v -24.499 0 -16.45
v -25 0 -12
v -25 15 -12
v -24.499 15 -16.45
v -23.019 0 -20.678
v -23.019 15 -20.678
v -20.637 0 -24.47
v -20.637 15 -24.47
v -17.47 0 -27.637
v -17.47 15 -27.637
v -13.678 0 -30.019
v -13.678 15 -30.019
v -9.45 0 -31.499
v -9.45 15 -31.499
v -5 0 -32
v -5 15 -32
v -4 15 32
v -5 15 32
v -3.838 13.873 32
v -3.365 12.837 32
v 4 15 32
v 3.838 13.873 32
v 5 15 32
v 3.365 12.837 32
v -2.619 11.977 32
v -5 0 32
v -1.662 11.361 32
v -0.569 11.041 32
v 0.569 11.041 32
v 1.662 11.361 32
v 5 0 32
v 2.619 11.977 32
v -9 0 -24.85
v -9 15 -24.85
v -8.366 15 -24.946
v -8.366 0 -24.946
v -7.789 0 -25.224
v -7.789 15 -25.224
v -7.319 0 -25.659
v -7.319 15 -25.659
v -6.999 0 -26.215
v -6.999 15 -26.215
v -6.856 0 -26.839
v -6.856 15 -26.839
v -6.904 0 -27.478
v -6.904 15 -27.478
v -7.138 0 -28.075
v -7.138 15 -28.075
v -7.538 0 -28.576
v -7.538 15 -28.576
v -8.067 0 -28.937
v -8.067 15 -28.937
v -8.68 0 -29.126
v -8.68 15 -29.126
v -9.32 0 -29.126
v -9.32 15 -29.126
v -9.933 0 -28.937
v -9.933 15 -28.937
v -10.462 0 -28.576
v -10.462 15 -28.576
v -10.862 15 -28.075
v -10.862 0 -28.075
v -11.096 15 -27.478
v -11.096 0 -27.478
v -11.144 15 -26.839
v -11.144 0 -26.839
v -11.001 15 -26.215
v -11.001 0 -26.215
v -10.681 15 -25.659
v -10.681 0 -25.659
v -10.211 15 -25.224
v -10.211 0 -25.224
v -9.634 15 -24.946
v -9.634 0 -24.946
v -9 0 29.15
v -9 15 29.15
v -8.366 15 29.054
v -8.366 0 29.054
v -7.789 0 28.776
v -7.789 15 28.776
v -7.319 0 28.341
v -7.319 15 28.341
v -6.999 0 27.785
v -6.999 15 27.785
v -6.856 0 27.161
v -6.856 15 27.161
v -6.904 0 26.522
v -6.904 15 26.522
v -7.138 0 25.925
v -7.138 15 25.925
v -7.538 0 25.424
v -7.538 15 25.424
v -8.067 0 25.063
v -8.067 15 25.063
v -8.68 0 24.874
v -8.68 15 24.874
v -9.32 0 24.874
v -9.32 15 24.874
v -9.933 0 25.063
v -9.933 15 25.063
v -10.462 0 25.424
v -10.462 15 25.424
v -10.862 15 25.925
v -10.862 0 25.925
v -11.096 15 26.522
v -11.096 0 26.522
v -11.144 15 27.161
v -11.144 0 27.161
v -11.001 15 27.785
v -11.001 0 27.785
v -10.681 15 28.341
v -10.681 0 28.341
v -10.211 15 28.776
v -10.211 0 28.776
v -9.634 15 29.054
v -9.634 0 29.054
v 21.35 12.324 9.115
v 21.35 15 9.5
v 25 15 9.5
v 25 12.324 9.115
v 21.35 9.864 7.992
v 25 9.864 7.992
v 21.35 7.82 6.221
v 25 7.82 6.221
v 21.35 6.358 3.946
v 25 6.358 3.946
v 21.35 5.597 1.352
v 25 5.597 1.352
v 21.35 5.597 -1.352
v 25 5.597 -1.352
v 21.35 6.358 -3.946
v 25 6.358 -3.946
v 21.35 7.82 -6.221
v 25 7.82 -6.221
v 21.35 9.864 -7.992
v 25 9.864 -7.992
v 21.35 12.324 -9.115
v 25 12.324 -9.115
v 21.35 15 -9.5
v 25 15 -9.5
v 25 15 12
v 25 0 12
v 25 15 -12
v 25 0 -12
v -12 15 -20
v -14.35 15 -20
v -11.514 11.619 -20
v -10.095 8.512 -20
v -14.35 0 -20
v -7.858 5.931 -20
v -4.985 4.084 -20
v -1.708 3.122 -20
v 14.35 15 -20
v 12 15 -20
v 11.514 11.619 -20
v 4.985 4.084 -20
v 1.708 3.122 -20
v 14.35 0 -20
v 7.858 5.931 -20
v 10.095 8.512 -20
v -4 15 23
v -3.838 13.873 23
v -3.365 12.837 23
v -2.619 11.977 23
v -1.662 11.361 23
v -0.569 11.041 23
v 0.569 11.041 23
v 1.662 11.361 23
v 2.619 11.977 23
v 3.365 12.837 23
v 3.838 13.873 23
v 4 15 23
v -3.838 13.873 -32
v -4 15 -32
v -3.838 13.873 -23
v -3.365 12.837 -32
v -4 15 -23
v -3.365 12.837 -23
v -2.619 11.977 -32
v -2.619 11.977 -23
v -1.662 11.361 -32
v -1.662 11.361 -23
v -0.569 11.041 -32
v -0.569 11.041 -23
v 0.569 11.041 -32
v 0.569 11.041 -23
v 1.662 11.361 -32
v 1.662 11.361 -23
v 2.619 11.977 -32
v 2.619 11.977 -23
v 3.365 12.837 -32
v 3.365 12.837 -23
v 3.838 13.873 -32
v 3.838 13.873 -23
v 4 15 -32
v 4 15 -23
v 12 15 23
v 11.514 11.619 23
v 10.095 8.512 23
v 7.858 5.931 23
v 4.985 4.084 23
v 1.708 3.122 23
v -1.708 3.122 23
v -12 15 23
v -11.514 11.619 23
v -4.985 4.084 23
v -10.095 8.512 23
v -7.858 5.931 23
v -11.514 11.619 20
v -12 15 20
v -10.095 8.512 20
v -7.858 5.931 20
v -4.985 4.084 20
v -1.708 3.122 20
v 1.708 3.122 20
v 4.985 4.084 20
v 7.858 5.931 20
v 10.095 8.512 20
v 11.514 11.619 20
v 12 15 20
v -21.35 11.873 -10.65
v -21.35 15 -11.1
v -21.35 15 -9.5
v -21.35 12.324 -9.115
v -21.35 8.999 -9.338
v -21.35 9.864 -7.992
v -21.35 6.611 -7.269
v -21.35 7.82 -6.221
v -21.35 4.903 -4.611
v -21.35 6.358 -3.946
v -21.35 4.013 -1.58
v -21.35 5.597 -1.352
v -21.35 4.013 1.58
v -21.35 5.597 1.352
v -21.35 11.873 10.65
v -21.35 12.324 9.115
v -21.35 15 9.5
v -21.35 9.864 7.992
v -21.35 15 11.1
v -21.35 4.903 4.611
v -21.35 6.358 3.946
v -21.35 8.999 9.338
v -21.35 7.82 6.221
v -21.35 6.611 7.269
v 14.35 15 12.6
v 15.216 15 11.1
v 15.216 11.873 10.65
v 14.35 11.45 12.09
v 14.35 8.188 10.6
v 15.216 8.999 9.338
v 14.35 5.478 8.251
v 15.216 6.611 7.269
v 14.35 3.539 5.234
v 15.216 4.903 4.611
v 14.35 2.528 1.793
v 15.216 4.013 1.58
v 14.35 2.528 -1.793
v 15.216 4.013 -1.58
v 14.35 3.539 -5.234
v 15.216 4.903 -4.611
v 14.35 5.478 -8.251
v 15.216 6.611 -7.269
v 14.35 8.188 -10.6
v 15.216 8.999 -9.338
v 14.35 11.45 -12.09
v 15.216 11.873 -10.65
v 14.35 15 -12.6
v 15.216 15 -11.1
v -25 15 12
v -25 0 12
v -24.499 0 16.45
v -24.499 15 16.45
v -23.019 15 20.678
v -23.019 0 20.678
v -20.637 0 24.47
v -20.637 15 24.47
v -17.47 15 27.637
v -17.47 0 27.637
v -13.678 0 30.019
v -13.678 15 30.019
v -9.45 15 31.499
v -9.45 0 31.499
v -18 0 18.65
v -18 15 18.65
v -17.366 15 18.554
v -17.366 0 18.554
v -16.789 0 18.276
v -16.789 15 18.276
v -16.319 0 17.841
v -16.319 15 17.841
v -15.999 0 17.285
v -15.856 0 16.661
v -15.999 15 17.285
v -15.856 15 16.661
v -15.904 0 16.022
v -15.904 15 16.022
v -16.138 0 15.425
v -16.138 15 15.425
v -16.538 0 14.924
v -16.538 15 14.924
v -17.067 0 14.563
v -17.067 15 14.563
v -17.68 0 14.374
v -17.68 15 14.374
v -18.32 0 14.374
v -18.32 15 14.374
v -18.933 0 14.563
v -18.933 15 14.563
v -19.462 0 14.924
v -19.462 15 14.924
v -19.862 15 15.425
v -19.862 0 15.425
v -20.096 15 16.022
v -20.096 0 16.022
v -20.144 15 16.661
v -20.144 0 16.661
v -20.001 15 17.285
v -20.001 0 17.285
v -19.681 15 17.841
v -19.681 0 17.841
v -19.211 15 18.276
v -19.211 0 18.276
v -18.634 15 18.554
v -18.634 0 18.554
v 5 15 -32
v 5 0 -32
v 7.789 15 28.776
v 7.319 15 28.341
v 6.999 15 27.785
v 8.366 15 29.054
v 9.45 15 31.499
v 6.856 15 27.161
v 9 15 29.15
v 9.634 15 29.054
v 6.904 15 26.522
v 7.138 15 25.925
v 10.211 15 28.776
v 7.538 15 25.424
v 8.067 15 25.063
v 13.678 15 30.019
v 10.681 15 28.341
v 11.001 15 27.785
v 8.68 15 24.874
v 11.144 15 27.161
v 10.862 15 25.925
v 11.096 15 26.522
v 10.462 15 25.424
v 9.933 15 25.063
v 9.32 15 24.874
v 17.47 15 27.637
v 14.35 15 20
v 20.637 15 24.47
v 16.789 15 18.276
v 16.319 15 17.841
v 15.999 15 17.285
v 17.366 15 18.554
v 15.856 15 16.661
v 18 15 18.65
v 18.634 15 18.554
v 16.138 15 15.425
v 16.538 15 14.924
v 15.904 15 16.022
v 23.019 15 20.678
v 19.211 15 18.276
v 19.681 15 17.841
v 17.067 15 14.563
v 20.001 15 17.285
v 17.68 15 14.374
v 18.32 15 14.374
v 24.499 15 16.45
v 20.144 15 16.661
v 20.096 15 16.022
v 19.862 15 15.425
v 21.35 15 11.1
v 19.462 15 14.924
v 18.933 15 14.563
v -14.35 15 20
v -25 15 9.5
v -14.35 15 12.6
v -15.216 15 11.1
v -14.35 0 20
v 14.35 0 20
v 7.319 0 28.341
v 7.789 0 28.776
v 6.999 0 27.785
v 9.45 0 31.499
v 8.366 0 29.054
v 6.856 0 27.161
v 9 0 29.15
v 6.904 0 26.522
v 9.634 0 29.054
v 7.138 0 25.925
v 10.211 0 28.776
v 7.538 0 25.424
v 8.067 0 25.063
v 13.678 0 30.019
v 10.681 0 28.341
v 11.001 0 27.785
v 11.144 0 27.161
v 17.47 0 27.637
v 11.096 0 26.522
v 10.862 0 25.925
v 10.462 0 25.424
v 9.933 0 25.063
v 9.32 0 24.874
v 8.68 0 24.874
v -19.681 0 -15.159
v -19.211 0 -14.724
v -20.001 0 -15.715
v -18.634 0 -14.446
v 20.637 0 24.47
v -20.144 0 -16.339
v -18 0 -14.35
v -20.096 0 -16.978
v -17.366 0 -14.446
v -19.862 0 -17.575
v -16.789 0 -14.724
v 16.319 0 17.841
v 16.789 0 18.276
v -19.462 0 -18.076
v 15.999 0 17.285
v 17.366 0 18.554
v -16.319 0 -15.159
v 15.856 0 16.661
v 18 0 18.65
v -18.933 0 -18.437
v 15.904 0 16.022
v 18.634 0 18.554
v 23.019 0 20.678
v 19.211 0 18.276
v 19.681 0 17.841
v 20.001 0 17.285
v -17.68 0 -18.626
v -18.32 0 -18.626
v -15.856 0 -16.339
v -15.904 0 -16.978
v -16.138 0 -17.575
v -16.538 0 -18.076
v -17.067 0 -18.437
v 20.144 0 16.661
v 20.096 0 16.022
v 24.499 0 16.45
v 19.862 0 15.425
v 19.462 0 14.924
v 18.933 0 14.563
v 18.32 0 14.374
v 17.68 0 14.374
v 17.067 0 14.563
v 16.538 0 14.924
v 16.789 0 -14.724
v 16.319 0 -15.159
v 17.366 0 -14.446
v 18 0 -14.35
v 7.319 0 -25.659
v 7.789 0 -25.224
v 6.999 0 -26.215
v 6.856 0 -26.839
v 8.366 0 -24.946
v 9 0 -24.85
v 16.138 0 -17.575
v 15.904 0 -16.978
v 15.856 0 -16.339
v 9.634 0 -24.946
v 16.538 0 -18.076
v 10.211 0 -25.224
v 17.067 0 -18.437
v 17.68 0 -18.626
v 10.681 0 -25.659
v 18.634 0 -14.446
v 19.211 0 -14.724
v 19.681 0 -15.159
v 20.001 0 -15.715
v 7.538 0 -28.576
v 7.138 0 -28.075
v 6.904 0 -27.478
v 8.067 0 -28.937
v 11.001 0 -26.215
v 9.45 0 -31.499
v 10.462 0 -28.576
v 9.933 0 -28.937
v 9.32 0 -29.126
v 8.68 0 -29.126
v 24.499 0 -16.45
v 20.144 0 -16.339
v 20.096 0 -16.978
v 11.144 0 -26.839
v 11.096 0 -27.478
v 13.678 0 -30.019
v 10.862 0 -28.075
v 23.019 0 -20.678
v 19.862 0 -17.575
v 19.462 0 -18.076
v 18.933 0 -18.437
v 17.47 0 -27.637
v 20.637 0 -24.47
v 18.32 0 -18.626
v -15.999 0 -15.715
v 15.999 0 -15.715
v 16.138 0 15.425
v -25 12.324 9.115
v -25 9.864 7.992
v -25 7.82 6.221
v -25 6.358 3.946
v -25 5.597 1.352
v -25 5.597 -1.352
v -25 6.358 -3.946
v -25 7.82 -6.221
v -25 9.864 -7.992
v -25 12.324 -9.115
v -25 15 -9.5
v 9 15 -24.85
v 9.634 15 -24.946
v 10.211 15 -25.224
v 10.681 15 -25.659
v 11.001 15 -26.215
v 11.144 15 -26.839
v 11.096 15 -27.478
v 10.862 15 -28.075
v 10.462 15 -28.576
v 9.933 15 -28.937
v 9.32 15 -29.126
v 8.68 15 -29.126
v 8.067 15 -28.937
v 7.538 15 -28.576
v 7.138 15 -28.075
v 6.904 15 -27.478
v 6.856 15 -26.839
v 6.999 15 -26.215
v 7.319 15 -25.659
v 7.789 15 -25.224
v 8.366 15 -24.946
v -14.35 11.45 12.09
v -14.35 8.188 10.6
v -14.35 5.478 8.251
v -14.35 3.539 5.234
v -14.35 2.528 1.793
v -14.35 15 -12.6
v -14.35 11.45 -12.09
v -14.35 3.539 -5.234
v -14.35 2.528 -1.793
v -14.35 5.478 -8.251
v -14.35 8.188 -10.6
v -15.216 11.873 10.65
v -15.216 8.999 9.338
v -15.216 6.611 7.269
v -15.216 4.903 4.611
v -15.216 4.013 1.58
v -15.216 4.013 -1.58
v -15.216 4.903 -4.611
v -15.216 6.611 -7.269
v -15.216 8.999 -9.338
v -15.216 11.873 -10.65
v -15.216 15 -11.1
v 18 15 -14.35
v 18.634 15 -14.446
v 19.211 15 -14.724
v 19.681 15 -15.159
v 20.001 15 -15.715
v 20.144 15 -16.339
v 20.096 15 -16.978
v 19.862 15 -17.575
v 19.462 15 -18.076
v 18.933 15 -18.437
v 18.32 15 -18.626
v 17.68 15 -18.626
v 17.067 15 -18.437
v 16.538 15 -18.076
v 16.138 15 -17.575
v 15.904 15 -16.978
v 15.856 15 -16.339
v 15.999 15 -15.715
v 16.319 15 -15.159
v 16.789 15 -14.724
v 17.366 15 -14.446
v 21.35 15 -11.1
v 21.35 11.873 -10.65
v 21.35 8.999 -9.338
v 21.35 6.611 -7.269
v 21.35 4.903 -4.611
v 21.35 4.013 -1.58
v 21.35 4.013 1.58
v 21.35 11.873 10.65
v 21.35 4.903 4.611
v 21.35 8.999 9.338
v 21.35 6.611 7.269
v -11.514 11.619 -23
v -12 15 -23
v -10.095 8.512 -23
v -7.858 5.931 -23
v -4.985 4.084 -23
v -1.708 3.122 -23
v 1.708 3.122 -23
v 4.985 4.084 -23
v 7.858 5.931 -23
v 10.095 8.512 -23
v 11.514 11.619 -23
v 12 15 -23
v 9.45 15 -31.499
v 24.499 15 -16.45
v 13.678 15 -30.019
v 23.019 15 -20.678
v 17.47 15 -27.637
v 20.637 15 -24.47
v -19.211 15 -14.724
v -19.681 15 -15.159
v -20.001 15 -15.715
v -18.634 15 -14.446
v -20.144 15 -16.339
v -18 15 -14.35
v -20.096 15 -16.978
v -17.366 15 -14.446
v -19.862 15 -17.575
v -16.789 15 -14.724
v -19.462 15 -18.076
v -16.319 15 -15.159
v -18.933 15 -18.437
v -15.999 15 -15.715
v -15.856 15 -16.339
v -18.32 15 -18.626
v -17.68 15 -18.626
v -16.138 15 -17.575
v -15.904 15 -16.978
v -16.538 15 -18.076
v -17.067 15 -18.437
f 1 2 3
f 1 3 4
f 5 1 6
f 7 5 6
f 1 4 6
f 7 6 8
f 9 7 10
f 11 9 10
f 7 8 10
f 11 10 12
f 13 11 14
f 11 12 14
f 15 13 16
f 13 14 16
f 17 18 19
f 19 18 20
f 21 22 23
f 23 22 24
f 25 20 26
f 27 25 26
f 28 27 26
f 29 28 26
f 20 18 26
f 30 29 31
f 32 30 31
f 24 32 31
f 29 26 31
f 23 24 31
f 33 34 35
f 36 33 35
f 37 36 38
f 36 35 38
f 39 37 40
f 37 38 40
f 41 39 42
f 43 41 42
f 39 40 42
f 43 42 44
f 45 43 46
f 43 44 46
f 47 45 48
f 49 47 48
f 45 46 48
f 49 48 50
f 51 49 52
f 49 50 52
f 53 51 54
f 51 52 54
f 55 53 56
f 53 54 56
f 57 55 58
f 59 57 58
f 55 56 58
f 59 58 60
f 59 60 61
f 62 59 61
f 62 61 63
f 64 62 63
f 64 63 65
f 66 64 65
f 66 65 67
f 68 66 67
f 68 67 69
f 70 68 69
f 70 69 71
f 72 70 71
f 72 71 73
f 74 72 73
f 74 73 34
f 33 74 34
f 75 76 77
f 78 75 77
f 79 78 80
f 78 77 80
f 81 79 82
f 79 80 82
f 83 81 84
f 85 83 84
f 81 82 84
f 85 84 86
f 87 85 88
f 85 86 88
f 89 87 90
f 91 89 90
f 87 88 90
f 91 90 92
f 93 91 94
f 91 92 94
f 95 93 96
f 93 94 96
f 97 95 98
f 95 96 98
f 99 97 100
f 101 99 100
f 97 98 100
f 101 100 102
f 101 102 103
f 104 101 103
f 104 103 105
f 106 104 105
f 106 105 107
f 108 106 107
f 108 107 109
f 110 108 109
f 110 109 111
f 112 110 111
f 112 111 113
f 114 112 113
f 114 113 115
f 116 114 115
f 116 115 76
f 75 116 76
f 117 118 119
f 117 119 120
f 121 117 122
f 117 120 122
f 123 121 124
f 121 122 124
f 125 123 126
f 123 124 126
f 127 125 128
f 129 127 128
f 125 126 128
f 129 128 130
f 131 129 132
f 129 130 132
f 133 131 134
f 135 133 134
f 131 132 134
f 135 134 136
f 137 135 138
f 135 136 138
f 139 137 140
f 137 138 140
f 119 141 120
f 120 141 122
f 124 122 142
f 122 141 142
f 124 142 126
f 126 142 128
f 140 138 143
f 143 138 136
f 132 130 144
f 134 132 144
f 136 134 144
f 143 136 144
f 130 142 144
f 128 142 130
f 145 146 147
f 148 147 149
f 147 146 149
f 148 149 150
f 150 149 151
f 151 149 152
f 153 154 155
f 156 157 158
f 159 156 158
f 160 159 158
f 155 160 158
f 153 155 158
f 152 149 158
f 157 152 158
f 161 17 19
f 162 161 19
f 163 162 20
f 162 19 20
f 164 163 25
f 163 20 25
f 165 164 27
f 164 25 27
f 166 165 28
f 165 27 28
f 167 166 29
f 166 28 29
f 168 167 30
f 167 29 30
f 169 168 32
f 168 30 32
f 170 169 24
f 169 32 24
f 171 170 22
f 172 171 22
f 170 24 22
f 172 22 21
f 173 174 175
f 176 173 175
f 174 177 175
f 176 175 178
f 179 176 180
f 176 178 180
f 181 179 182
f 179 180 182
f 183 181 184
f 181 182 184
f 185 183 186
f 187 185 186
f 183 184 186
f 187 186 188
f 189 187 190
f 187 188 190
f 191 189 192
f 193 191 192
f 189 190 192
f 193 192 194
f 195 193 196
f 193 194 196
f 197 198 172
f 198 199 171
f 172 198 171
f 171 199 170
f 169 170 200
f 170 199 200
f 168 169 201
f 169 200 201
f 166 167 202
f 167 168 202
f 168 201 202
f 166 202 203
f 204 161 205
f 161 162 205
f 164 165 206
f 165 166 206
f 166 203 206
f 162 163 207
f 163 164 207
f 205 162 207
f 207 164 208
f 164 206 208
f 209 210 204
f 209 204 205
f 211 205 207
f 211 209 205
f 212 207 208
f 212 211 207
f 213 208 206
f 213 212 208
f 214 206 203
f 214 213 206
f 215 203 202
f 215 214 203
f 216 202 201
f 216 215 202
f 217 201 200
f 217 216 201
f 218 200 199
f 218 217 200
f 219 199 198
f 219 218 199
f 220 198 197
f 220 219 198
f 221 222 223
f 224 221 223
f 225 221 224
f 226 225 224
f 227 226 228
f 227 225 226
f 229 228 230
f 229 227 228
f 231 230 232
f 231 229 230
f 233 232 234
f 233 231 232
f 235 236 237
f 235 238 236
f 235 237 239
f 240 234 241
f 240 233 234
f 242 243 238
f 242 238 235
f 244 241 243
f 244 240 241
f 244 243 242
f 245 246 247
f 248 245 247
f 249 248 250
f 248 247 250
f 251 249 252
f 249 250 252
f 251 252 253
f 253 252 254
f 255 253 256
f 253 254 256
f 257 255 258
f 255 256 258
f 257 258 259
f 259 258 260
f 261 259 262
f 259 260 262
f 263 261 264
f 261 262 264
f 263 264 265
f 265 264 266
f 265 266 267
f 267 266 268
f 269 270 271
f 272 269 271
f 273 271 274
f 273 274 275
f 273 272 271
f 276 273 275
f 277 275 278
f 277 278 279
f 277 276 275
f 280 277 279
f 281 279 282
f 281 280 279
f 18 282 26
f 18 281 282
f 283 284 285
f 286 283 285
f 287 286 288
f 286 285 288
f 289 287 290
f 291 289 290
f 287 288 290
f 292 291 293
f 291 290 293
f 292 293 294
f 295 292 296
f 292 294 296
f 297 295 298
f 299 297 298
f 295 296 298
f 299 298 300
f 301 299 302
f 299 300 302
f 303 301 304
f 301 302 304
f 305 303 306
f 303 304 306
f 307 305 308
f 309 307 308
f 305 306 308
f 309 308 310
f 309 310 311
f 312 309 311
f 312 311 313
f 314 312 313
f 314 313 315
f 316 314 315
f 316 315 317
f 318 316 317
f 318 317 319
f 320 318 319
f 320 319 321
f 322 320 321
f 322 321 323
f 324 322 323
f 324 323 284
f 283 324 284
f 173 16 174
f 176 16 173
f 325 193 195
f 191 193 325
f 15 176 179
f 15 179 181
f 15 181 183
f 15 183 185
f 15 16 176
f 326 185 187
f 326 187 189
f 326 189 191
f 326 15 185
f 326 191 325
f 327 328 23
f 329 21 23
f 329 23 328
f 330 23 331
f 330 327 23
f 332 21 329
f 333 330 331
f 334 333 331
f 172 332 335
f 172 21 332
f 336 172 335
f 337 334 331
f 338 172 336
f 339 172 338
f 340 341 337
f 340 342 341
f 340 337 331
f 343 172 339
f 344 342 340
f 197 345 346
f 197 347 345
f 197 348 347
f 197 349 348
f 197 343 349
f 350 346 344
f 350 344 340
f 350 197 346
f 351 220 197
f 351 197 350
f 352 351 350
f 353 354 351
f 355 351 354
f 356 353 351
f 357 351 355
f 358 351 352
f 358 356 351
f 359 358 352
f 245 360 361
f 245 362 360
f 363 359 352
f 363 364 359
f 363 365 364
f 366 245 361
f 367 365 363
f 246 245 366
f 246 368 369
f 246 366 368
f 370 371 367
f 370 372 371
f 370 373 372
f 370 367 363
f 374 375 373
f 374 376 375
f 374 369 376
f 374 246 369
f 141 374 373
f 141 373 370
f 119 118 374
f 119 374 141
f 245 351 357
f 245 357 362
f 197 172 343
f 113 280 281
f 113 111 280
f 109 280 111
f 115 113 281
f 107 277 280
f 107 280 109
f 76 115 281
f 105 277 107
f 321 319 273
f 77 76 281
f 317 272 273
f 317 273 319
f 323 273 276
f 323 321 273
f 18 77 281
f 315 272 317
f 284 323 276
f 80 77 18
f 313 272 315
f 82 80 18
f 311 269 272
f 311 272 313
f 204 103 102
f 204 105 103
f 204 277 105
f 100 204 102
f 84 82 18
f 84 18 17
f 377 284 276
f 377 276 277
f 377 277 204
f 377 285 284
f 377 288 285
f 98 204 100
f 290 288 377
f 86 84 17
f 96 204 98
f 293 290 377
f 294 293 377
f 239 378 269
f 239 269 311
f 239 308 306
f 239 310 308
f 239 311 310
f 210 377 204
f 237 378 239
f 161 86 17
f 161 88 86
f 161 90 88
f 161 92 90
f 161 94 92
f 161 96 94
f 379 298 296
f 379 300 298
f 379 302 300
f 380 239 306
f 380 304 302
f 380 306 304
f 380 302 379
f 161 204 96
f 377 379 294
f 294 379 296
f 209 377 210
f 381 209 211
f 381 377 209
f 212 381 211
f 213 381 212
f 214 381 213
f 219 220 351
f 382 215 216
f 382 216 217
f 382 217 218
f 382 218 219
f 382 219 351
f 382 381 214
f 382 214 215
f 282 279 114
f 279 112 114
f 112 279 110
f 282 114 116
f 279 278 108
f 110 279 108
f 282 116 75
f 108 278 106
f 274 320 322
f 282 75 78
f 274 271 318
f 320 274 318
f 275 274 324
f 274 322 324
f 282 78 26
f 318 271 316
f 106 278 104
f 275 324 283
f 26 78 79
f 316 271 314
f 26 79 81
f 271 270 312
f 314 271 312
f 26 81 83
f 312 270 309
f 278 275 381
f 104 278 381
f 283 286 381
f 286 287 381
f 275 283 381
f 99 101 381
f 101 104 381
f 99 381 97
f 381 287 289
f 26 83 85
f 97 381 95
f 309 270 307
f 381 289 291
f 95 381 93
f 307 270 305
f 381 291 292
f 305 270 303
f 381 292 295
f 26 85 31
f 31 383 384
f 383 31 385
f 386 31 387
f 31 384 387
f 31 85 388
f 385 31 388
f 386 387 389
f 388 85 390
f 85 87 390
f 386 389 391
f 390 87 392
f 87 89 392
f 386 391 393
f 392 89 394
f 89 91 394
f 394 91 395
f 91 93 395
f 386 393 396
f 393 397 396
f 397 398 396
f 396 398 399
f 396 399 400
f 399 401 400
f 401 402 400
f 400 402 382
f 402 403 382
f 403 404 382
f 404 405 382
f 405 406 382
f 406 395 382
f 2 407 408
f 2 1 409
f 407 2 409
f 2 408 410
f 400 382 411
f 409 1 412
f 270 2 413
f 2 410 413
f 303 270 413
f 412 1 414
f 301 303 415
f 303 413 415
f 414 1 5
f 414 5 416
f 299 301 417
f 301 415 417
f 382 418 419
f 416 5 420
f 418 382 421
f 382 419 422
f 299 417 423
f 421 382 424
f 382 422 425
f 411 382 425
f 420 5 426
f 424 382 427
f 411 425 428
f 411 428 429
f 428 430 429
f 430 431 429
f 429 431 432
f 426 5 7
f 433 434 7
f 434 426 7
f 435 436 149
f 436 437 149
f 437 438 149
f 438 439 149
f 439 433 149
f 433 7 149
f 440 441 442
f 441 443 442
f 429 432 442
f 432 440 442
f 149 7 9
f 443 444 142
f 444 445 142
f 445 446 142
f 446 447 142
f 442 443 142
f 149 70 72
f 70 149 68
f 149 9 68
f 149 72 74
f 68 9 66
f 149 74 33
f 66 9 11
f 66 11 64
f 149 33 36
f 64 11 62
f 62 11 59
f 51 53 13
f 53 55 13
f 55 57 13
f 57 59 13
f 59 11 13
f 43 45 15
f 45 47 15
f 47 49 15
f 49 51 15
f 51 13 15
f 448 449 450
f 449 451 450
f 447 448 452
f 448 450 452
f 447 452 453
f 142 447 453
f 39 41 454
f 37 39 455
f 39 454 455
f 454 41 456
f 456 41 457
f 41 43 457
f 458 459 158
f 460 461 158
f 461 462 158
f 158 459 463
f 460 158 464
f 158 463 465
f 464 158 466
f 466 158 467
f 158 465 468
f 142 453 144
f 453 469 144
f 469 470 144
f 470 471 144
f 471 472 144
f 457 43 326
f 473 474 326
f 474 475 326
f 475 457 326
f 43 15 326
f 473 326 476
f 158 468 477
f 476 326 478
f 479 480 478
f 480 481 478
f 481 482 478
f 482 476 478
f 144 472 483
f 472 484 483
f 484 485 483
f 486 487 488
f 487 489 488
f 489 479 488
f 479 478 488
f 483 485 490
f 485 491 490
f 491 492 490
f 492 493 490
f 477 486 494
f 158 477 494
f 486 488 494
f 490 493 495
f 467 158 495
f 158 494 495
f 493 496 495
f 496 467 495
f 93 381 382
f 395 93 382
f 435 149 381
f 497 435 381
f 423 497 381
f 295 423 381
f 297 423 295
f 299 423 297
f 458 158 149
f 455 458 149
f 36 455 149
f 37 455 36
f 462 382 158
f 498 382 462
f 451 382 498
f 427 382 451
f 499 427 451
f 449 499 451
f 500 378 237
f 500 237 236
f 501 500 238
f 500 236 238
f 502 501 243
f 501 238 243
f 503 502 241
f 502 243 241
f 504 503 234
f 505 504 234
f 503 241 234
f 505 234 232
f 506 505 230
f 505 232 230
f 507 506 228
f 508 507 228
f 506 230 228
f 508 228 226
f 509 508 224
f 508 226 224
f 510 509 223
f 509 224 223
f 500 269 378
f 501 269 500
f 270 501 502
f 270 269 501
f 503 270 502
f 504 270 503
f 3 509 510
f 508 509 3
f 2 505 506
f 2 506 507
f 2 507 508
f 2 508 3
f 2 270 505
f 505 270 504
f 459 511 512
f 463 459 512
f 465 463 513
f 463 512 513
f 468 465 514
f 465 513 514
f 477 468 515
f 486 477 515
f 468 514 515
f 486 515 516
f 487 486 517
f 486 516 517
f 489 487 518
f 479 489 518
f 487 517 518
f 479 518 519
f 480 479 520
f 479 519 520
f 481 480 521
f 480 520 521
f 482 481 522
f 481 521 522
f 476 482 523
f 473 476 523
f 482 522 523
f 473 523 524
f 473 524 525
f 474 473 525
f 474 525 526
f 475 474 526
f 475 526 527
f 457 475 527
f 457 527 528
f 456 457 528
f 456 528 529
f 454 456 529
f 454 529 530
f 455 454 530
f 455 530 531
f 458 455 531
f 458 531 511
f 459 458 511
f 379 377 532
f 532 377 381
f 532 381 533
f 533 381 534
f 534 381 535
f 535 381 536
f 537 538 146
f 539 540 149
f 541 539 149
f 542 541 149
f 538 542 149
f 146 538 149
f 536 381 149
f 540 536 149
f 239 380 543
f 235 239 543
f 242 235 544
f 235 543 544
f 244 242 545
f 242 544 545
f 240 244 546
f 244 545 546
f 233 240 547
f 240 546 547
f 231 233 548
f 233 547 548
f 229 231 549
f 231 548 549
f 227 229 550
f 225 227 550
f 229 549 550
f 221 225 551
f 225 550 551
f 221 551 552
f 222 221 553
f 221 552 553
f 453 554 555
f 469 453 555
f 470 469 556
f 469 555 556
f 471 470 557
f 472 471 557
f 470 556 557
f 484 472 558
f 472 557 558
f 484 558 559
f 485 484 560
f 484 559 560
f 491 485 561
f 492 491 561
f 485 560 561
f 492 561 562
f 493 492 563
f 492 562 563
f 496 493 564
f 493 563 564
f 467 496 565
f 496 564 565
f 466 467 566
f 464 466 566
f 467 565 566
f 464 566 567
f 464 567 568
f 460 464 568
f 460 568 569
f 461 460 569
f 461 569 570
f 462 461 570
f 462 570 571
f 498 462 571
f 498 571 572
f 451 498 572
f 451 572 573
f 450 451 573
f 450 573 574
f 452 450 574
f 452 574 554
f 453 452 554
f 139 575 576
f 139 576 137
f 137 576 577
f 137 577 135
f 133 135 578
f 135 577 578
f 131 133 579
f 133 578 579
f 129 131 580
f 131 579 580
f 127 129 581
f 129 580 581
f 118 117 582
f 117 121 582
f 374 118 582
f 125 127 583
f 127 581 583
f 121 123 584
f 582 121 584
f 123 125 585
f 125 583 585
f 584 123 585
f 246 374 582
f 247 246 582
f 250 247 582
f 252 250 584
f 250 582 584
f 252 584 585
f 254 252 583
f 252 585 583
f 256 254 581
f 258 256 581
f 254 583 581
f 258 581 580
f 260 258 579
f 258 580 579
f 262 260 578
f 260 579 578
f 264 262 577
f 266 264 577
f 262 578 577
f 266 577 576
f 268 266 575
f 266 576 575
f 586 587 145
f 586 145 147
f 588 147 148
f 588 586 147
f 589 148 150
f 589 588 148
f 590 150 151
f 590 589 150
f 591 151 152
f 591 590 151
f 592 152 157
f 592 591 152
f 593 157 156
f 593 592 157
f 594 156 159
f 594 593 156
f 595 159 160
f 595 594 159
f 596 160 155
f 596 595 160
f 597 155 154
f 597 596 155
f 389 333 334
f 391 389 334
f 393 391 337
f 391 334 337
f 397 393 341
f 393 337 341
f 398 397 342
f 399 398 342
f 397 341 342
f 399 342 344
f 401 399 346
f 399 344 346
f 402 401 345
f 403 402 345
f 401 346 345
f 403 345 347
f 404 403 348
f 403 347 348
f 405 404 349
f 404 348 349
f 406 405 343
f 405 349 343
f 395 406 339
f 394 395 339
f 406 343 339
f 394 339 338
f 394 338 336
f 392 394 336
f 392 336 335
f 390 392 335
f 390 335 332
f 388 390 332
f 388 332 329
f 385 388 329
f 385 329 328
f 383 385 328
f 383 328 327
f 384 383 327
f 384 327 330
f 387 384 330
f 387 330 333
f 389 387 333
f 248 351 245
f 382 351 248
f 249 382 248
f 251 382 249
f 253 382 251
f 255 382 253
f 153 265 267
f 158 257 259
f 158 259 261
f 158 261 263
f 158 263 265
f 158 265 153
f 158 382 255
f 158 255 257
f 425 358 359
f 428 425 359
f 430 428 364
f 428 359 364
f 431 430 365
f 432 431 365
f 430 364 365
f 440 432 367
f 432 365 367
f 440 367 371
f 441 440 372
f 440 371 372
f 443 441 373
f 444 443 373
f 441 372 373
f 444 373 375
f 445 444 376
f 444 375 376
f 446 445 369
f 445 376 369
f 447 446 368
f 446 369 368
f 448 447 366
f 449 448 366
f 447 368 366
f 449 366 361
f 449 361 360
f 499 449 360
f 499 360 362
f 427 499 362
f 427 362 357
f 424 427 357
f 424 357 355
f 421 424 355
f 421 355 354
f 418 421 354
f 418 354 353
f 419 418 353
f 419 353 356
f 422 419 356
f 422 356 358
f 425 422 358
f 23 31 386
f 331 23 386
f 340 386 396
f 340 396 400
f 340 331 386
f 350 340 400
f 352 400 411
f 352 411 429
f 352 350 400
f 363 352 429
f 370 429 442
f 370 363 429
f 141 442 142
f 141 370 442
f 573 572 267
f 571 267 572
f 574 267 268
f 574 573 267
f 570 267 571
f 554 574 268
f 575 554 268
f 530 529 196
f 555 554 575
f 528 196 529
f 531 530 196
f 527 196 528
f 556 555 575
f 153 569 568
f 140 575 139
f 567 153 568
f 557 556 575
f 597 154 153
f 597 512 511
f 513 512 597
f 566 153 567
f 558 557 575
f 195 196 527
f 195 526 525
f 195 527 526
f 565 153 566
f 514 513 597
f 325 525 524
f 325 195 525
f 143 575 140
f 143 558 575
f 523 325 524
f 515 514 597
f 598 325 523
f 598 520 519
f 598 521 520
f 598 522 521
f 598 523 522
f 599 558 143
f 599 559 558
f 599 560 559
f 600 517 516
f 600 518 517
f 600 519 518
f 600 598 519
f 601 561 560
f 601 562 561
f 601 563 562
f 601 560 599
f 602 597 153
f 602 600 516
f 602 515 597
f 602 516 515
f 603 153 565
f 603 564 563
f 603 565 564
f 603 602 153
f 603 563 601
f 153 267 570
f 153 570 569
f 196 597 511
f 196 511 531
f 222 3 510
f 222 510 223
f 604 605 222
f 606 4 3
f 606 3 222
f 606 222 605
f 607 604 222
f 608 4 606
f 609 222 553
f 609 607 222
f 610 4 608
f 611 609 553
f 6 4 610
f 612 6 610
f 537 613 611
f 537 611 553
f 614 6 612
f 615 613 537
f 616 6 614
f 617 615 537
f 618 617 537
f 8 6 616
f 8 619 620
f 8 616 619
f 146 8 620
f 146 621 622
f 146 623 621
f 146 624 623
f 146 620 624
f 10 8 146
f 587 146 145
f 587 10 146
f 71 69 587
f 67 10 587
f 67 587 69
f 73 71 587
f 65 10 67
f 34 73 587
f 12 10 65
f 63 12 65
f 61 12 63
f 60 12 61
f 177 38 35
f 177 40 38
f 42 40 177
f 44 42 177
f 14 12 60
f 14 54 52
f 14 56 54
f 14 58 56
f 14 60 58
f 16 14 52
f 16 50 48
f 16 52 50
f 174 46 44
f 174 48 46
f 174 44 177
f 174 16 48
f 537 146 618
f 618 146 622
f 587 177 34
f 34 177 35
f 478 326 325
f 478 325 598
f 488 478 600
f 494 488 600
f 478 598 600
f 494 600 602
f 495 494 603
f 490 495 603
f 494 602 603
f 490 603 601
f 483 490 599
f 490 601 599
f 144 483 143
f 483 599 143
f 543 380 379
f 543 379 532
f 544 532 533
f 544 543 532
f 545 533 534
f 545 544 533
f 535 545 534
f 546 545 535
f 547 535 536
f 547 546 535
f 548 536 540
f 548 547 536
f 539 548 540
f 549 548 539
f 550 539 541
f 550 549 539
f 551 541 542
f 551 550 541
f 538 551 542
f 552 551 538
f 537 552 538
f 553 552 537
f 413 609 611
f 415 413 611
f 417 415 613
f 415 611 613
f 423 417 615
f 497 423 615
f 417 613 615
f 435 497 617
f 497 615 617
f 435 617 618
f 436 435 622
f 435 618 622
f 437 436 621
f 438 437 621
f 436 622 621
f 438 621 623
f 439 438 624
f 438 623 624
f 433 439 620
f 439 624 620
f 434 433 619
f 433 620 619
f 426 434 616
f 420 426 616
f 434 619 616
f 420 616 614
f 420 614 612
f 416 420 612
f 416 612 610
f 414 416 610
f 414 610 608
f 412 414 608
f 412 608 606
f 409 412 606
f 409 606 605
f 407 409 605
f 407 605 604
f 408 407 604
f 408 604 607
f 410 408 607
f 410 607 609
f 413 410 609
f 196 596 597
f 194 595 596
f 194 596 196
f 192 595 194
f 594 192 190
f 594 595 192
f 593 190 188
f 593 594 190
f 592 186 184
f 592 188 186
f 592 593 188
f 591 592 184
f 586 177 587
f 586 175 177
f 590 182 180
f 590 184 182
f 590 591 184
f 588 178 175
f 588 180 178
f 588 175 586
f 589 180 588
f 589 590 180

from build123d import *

# Parameters (mm, degrees)
SKETCH1_W             = 50
SKETCH1_H             = 64
SKETCH1_W_2           = 28.7
SKETCH1_H_2           = 40
BOSS_EXTRUDE1_DEPTH   = 15
SKETCH3_W             = 7
SKETCH3_H             = 11.1
SKETCH4_R             = 9.5
CUT_EXTRUDE2_DEPTH    = 51
SKETCH5_R             = 4
CUT_EXTRUDE3_DEPTH    = 65
SKETCH8_R             = 2.15
CUT_EXTRUDE6_DEPTH    = 16
FILLET1_R             = 20
CHAMFER1_SIZE         = 1.5
CHAMFER1_SIZE2        = 0.866025404
CHAMFER1_PART_2_SIZE  = 1.5
CHAMFER1_PART_2_SIZE2 = 0.866025404
SKETCH9_W             = 12
SKETCH9_H             = 3


with BuildPart() as part:
    # Sketch1 → Boss-Extrude1 (new body)
    with BuildSketch(Plane(origin=(0, 0, 0), x_dir=(1, 0, 0), z_dir=(0, 1, 0))):
        Rectangle(SKETCH1_W, SKETCH1_H)
        Rectangle(SKETCH1_W_2, SKETCH1_H_2, mode=Mode.SUBTRACT)
    extrude(amount=BOSS_EXTRUDE1_DEPTH)

    # Sketch3 → Cut-Revolve1 (revolve, cut)
    with BuildSketch(Plane(origin=(0, 15, 0), x_dir=(1, 0, 0), z_dir=(0, 1, 0))):
        with Locations((17.85, -5.55)):
            Rectangle(SKETCH3_W, SKETCH3_H)
        with Locations((-17.85, -5.55)):
            Rectangle(SKETCH3_W, SKETCH3_H)
    revolve(axis=Axis((14.35, 15, 0), (1, 0, 0)), mode=Mode.SUBTRACT)

    # Sketch4 → Cut-Extrude2 (cut, through all)
    with BuildSketch(Plane(origin=(25, 0, 0), x_dir=(0, 0, -1), z_dir=(1, 0, 0))):
        with Locations((0, 15)):
            Circle(SKETCH4_R)
    extrude(amount=-CUT_EXTRUDE2_DEPTH, mode=Mode.SUBTRACT)

    # Sketch5 → Cut-Extrude3 (cut, through all)
    with BuildSketch(Plane.XY.offset(32)):
        with Locations((0, 15)):
            Circle(SKETCH5_R)
    extrude(amount=-CUT_EXTRUDE3_DEPTH, mode=Mode.SUBTRACT)

    # Sketch8 → Cut-Extrude6 (cut, through all)
    with BuildSketch(Plane(origin=(0, 15, 0), x_dir=(1, 0, 0), z_dir=(0, 1, 0))):
        with Locations(Location((18, 16.5, 0), (0, 0, 270))):  # turned: the seam where the file's is
            Circle(SKETCH8_R)
        with Locations(Location((18, -16.5, 0), (0, 0, 270))):  # turned: the seam where the file's is
            Circle(SKETCH8_R)
        with Locations(Location((-18, -16.5, 0), (0, 0, 270))):  # turned: the seam where the file's is
            Circle(SKETCH8_R)
        with Locations(Location((-18, 16.5, 0), (0, 0, 270))):  # turned: the seam where the file's is
            Circle(SKETCH8_R)
        with Locations(Location((9, -27, 0), (0, 0, 270))):  # turned: the seam where the file's is
            Circle(SKETCH8_R)
        with Locations(Location((-9, -27, 0), (0, 0, 270))):  # turned: the seam where the file's is
            Circle(SKETCH8_R)
        with Locations(Location((-9, 27, 0), (0, 0, 270))):  # turned: the seam where the file's is
            Circle(SKETCH8_R)
        with Locations(Location((9, 27, 0), (0, 0, 270))):  # turned: the seam where the file's is
            Circle(SKETCH8_R)
    extrude(amount=-CUT_EXTRUDE6_DEPTH, mode=Mode.SUBTRACT)

    # Fillet1
    fillet1_edges = [part.edges().sort_by_distance(p)[0] for p in [
        (-25, 7.5, -32),
        (25, 7.5, -32),
        (25, 7.5, 32),
        (-25, 7.5, 32),
    ]]
    fillet(fillet1_edges, radius=FILLET1_R)

    # Chamfer1
    chamfer1_edges = [part.edges().sort_by_distance(p)[0] for p in [
        (14.35, 3.9, 0),
    ]]
    chamfer1_side = [part.faces().sort_by_distance(p)[0] for p in [
        (14.35, 0.427200187, 0),
    ]]
    chamfer(chamfer1_edges, length=CHAMFER1_SIZE, length2=CHAMFER1_SIZE2, reference=chamfer1_side[0])

    # Chamfer1 part 2
    chamfer1_part_2_edges = [part.edges().sort_by_distance(p)[0] for p in [
        (-14.35, 3.9, 0),
    ]]
    chamfer1_part_2_side = [part.faces().sort_by_distance(p)[0] for p in [
        (-14.35, 0.427200187, 0),
    ]]
    chamfer(chamfer1_part_2_edges, length=CHAMFER1_PART_2_SIZE, length2=CHAMFER1_PART_2_SIZE2, reference=chamfer1_part_2_side[0])

    # Sketch9 → Cut-Revolve2 (revolve, cut)
    with BuildSketch(Plane(origin=(0, 15, 0), x_dir=(1, 0, 0), z_dir=(0, 1, 0))):
        with Locations((-6, -21.5)):
            Rectangle(SKETCH9_W, SKETCH9_H)
        with Locations((-6, 21.5)):
            Rectangle(SKETCH9_W, SKETCH9_H)
    revolve(axis=Axis((0, 15, -29.871415895), (0, 0, 1)), mode=Mode.SUBTRACT)


solid = part.part
